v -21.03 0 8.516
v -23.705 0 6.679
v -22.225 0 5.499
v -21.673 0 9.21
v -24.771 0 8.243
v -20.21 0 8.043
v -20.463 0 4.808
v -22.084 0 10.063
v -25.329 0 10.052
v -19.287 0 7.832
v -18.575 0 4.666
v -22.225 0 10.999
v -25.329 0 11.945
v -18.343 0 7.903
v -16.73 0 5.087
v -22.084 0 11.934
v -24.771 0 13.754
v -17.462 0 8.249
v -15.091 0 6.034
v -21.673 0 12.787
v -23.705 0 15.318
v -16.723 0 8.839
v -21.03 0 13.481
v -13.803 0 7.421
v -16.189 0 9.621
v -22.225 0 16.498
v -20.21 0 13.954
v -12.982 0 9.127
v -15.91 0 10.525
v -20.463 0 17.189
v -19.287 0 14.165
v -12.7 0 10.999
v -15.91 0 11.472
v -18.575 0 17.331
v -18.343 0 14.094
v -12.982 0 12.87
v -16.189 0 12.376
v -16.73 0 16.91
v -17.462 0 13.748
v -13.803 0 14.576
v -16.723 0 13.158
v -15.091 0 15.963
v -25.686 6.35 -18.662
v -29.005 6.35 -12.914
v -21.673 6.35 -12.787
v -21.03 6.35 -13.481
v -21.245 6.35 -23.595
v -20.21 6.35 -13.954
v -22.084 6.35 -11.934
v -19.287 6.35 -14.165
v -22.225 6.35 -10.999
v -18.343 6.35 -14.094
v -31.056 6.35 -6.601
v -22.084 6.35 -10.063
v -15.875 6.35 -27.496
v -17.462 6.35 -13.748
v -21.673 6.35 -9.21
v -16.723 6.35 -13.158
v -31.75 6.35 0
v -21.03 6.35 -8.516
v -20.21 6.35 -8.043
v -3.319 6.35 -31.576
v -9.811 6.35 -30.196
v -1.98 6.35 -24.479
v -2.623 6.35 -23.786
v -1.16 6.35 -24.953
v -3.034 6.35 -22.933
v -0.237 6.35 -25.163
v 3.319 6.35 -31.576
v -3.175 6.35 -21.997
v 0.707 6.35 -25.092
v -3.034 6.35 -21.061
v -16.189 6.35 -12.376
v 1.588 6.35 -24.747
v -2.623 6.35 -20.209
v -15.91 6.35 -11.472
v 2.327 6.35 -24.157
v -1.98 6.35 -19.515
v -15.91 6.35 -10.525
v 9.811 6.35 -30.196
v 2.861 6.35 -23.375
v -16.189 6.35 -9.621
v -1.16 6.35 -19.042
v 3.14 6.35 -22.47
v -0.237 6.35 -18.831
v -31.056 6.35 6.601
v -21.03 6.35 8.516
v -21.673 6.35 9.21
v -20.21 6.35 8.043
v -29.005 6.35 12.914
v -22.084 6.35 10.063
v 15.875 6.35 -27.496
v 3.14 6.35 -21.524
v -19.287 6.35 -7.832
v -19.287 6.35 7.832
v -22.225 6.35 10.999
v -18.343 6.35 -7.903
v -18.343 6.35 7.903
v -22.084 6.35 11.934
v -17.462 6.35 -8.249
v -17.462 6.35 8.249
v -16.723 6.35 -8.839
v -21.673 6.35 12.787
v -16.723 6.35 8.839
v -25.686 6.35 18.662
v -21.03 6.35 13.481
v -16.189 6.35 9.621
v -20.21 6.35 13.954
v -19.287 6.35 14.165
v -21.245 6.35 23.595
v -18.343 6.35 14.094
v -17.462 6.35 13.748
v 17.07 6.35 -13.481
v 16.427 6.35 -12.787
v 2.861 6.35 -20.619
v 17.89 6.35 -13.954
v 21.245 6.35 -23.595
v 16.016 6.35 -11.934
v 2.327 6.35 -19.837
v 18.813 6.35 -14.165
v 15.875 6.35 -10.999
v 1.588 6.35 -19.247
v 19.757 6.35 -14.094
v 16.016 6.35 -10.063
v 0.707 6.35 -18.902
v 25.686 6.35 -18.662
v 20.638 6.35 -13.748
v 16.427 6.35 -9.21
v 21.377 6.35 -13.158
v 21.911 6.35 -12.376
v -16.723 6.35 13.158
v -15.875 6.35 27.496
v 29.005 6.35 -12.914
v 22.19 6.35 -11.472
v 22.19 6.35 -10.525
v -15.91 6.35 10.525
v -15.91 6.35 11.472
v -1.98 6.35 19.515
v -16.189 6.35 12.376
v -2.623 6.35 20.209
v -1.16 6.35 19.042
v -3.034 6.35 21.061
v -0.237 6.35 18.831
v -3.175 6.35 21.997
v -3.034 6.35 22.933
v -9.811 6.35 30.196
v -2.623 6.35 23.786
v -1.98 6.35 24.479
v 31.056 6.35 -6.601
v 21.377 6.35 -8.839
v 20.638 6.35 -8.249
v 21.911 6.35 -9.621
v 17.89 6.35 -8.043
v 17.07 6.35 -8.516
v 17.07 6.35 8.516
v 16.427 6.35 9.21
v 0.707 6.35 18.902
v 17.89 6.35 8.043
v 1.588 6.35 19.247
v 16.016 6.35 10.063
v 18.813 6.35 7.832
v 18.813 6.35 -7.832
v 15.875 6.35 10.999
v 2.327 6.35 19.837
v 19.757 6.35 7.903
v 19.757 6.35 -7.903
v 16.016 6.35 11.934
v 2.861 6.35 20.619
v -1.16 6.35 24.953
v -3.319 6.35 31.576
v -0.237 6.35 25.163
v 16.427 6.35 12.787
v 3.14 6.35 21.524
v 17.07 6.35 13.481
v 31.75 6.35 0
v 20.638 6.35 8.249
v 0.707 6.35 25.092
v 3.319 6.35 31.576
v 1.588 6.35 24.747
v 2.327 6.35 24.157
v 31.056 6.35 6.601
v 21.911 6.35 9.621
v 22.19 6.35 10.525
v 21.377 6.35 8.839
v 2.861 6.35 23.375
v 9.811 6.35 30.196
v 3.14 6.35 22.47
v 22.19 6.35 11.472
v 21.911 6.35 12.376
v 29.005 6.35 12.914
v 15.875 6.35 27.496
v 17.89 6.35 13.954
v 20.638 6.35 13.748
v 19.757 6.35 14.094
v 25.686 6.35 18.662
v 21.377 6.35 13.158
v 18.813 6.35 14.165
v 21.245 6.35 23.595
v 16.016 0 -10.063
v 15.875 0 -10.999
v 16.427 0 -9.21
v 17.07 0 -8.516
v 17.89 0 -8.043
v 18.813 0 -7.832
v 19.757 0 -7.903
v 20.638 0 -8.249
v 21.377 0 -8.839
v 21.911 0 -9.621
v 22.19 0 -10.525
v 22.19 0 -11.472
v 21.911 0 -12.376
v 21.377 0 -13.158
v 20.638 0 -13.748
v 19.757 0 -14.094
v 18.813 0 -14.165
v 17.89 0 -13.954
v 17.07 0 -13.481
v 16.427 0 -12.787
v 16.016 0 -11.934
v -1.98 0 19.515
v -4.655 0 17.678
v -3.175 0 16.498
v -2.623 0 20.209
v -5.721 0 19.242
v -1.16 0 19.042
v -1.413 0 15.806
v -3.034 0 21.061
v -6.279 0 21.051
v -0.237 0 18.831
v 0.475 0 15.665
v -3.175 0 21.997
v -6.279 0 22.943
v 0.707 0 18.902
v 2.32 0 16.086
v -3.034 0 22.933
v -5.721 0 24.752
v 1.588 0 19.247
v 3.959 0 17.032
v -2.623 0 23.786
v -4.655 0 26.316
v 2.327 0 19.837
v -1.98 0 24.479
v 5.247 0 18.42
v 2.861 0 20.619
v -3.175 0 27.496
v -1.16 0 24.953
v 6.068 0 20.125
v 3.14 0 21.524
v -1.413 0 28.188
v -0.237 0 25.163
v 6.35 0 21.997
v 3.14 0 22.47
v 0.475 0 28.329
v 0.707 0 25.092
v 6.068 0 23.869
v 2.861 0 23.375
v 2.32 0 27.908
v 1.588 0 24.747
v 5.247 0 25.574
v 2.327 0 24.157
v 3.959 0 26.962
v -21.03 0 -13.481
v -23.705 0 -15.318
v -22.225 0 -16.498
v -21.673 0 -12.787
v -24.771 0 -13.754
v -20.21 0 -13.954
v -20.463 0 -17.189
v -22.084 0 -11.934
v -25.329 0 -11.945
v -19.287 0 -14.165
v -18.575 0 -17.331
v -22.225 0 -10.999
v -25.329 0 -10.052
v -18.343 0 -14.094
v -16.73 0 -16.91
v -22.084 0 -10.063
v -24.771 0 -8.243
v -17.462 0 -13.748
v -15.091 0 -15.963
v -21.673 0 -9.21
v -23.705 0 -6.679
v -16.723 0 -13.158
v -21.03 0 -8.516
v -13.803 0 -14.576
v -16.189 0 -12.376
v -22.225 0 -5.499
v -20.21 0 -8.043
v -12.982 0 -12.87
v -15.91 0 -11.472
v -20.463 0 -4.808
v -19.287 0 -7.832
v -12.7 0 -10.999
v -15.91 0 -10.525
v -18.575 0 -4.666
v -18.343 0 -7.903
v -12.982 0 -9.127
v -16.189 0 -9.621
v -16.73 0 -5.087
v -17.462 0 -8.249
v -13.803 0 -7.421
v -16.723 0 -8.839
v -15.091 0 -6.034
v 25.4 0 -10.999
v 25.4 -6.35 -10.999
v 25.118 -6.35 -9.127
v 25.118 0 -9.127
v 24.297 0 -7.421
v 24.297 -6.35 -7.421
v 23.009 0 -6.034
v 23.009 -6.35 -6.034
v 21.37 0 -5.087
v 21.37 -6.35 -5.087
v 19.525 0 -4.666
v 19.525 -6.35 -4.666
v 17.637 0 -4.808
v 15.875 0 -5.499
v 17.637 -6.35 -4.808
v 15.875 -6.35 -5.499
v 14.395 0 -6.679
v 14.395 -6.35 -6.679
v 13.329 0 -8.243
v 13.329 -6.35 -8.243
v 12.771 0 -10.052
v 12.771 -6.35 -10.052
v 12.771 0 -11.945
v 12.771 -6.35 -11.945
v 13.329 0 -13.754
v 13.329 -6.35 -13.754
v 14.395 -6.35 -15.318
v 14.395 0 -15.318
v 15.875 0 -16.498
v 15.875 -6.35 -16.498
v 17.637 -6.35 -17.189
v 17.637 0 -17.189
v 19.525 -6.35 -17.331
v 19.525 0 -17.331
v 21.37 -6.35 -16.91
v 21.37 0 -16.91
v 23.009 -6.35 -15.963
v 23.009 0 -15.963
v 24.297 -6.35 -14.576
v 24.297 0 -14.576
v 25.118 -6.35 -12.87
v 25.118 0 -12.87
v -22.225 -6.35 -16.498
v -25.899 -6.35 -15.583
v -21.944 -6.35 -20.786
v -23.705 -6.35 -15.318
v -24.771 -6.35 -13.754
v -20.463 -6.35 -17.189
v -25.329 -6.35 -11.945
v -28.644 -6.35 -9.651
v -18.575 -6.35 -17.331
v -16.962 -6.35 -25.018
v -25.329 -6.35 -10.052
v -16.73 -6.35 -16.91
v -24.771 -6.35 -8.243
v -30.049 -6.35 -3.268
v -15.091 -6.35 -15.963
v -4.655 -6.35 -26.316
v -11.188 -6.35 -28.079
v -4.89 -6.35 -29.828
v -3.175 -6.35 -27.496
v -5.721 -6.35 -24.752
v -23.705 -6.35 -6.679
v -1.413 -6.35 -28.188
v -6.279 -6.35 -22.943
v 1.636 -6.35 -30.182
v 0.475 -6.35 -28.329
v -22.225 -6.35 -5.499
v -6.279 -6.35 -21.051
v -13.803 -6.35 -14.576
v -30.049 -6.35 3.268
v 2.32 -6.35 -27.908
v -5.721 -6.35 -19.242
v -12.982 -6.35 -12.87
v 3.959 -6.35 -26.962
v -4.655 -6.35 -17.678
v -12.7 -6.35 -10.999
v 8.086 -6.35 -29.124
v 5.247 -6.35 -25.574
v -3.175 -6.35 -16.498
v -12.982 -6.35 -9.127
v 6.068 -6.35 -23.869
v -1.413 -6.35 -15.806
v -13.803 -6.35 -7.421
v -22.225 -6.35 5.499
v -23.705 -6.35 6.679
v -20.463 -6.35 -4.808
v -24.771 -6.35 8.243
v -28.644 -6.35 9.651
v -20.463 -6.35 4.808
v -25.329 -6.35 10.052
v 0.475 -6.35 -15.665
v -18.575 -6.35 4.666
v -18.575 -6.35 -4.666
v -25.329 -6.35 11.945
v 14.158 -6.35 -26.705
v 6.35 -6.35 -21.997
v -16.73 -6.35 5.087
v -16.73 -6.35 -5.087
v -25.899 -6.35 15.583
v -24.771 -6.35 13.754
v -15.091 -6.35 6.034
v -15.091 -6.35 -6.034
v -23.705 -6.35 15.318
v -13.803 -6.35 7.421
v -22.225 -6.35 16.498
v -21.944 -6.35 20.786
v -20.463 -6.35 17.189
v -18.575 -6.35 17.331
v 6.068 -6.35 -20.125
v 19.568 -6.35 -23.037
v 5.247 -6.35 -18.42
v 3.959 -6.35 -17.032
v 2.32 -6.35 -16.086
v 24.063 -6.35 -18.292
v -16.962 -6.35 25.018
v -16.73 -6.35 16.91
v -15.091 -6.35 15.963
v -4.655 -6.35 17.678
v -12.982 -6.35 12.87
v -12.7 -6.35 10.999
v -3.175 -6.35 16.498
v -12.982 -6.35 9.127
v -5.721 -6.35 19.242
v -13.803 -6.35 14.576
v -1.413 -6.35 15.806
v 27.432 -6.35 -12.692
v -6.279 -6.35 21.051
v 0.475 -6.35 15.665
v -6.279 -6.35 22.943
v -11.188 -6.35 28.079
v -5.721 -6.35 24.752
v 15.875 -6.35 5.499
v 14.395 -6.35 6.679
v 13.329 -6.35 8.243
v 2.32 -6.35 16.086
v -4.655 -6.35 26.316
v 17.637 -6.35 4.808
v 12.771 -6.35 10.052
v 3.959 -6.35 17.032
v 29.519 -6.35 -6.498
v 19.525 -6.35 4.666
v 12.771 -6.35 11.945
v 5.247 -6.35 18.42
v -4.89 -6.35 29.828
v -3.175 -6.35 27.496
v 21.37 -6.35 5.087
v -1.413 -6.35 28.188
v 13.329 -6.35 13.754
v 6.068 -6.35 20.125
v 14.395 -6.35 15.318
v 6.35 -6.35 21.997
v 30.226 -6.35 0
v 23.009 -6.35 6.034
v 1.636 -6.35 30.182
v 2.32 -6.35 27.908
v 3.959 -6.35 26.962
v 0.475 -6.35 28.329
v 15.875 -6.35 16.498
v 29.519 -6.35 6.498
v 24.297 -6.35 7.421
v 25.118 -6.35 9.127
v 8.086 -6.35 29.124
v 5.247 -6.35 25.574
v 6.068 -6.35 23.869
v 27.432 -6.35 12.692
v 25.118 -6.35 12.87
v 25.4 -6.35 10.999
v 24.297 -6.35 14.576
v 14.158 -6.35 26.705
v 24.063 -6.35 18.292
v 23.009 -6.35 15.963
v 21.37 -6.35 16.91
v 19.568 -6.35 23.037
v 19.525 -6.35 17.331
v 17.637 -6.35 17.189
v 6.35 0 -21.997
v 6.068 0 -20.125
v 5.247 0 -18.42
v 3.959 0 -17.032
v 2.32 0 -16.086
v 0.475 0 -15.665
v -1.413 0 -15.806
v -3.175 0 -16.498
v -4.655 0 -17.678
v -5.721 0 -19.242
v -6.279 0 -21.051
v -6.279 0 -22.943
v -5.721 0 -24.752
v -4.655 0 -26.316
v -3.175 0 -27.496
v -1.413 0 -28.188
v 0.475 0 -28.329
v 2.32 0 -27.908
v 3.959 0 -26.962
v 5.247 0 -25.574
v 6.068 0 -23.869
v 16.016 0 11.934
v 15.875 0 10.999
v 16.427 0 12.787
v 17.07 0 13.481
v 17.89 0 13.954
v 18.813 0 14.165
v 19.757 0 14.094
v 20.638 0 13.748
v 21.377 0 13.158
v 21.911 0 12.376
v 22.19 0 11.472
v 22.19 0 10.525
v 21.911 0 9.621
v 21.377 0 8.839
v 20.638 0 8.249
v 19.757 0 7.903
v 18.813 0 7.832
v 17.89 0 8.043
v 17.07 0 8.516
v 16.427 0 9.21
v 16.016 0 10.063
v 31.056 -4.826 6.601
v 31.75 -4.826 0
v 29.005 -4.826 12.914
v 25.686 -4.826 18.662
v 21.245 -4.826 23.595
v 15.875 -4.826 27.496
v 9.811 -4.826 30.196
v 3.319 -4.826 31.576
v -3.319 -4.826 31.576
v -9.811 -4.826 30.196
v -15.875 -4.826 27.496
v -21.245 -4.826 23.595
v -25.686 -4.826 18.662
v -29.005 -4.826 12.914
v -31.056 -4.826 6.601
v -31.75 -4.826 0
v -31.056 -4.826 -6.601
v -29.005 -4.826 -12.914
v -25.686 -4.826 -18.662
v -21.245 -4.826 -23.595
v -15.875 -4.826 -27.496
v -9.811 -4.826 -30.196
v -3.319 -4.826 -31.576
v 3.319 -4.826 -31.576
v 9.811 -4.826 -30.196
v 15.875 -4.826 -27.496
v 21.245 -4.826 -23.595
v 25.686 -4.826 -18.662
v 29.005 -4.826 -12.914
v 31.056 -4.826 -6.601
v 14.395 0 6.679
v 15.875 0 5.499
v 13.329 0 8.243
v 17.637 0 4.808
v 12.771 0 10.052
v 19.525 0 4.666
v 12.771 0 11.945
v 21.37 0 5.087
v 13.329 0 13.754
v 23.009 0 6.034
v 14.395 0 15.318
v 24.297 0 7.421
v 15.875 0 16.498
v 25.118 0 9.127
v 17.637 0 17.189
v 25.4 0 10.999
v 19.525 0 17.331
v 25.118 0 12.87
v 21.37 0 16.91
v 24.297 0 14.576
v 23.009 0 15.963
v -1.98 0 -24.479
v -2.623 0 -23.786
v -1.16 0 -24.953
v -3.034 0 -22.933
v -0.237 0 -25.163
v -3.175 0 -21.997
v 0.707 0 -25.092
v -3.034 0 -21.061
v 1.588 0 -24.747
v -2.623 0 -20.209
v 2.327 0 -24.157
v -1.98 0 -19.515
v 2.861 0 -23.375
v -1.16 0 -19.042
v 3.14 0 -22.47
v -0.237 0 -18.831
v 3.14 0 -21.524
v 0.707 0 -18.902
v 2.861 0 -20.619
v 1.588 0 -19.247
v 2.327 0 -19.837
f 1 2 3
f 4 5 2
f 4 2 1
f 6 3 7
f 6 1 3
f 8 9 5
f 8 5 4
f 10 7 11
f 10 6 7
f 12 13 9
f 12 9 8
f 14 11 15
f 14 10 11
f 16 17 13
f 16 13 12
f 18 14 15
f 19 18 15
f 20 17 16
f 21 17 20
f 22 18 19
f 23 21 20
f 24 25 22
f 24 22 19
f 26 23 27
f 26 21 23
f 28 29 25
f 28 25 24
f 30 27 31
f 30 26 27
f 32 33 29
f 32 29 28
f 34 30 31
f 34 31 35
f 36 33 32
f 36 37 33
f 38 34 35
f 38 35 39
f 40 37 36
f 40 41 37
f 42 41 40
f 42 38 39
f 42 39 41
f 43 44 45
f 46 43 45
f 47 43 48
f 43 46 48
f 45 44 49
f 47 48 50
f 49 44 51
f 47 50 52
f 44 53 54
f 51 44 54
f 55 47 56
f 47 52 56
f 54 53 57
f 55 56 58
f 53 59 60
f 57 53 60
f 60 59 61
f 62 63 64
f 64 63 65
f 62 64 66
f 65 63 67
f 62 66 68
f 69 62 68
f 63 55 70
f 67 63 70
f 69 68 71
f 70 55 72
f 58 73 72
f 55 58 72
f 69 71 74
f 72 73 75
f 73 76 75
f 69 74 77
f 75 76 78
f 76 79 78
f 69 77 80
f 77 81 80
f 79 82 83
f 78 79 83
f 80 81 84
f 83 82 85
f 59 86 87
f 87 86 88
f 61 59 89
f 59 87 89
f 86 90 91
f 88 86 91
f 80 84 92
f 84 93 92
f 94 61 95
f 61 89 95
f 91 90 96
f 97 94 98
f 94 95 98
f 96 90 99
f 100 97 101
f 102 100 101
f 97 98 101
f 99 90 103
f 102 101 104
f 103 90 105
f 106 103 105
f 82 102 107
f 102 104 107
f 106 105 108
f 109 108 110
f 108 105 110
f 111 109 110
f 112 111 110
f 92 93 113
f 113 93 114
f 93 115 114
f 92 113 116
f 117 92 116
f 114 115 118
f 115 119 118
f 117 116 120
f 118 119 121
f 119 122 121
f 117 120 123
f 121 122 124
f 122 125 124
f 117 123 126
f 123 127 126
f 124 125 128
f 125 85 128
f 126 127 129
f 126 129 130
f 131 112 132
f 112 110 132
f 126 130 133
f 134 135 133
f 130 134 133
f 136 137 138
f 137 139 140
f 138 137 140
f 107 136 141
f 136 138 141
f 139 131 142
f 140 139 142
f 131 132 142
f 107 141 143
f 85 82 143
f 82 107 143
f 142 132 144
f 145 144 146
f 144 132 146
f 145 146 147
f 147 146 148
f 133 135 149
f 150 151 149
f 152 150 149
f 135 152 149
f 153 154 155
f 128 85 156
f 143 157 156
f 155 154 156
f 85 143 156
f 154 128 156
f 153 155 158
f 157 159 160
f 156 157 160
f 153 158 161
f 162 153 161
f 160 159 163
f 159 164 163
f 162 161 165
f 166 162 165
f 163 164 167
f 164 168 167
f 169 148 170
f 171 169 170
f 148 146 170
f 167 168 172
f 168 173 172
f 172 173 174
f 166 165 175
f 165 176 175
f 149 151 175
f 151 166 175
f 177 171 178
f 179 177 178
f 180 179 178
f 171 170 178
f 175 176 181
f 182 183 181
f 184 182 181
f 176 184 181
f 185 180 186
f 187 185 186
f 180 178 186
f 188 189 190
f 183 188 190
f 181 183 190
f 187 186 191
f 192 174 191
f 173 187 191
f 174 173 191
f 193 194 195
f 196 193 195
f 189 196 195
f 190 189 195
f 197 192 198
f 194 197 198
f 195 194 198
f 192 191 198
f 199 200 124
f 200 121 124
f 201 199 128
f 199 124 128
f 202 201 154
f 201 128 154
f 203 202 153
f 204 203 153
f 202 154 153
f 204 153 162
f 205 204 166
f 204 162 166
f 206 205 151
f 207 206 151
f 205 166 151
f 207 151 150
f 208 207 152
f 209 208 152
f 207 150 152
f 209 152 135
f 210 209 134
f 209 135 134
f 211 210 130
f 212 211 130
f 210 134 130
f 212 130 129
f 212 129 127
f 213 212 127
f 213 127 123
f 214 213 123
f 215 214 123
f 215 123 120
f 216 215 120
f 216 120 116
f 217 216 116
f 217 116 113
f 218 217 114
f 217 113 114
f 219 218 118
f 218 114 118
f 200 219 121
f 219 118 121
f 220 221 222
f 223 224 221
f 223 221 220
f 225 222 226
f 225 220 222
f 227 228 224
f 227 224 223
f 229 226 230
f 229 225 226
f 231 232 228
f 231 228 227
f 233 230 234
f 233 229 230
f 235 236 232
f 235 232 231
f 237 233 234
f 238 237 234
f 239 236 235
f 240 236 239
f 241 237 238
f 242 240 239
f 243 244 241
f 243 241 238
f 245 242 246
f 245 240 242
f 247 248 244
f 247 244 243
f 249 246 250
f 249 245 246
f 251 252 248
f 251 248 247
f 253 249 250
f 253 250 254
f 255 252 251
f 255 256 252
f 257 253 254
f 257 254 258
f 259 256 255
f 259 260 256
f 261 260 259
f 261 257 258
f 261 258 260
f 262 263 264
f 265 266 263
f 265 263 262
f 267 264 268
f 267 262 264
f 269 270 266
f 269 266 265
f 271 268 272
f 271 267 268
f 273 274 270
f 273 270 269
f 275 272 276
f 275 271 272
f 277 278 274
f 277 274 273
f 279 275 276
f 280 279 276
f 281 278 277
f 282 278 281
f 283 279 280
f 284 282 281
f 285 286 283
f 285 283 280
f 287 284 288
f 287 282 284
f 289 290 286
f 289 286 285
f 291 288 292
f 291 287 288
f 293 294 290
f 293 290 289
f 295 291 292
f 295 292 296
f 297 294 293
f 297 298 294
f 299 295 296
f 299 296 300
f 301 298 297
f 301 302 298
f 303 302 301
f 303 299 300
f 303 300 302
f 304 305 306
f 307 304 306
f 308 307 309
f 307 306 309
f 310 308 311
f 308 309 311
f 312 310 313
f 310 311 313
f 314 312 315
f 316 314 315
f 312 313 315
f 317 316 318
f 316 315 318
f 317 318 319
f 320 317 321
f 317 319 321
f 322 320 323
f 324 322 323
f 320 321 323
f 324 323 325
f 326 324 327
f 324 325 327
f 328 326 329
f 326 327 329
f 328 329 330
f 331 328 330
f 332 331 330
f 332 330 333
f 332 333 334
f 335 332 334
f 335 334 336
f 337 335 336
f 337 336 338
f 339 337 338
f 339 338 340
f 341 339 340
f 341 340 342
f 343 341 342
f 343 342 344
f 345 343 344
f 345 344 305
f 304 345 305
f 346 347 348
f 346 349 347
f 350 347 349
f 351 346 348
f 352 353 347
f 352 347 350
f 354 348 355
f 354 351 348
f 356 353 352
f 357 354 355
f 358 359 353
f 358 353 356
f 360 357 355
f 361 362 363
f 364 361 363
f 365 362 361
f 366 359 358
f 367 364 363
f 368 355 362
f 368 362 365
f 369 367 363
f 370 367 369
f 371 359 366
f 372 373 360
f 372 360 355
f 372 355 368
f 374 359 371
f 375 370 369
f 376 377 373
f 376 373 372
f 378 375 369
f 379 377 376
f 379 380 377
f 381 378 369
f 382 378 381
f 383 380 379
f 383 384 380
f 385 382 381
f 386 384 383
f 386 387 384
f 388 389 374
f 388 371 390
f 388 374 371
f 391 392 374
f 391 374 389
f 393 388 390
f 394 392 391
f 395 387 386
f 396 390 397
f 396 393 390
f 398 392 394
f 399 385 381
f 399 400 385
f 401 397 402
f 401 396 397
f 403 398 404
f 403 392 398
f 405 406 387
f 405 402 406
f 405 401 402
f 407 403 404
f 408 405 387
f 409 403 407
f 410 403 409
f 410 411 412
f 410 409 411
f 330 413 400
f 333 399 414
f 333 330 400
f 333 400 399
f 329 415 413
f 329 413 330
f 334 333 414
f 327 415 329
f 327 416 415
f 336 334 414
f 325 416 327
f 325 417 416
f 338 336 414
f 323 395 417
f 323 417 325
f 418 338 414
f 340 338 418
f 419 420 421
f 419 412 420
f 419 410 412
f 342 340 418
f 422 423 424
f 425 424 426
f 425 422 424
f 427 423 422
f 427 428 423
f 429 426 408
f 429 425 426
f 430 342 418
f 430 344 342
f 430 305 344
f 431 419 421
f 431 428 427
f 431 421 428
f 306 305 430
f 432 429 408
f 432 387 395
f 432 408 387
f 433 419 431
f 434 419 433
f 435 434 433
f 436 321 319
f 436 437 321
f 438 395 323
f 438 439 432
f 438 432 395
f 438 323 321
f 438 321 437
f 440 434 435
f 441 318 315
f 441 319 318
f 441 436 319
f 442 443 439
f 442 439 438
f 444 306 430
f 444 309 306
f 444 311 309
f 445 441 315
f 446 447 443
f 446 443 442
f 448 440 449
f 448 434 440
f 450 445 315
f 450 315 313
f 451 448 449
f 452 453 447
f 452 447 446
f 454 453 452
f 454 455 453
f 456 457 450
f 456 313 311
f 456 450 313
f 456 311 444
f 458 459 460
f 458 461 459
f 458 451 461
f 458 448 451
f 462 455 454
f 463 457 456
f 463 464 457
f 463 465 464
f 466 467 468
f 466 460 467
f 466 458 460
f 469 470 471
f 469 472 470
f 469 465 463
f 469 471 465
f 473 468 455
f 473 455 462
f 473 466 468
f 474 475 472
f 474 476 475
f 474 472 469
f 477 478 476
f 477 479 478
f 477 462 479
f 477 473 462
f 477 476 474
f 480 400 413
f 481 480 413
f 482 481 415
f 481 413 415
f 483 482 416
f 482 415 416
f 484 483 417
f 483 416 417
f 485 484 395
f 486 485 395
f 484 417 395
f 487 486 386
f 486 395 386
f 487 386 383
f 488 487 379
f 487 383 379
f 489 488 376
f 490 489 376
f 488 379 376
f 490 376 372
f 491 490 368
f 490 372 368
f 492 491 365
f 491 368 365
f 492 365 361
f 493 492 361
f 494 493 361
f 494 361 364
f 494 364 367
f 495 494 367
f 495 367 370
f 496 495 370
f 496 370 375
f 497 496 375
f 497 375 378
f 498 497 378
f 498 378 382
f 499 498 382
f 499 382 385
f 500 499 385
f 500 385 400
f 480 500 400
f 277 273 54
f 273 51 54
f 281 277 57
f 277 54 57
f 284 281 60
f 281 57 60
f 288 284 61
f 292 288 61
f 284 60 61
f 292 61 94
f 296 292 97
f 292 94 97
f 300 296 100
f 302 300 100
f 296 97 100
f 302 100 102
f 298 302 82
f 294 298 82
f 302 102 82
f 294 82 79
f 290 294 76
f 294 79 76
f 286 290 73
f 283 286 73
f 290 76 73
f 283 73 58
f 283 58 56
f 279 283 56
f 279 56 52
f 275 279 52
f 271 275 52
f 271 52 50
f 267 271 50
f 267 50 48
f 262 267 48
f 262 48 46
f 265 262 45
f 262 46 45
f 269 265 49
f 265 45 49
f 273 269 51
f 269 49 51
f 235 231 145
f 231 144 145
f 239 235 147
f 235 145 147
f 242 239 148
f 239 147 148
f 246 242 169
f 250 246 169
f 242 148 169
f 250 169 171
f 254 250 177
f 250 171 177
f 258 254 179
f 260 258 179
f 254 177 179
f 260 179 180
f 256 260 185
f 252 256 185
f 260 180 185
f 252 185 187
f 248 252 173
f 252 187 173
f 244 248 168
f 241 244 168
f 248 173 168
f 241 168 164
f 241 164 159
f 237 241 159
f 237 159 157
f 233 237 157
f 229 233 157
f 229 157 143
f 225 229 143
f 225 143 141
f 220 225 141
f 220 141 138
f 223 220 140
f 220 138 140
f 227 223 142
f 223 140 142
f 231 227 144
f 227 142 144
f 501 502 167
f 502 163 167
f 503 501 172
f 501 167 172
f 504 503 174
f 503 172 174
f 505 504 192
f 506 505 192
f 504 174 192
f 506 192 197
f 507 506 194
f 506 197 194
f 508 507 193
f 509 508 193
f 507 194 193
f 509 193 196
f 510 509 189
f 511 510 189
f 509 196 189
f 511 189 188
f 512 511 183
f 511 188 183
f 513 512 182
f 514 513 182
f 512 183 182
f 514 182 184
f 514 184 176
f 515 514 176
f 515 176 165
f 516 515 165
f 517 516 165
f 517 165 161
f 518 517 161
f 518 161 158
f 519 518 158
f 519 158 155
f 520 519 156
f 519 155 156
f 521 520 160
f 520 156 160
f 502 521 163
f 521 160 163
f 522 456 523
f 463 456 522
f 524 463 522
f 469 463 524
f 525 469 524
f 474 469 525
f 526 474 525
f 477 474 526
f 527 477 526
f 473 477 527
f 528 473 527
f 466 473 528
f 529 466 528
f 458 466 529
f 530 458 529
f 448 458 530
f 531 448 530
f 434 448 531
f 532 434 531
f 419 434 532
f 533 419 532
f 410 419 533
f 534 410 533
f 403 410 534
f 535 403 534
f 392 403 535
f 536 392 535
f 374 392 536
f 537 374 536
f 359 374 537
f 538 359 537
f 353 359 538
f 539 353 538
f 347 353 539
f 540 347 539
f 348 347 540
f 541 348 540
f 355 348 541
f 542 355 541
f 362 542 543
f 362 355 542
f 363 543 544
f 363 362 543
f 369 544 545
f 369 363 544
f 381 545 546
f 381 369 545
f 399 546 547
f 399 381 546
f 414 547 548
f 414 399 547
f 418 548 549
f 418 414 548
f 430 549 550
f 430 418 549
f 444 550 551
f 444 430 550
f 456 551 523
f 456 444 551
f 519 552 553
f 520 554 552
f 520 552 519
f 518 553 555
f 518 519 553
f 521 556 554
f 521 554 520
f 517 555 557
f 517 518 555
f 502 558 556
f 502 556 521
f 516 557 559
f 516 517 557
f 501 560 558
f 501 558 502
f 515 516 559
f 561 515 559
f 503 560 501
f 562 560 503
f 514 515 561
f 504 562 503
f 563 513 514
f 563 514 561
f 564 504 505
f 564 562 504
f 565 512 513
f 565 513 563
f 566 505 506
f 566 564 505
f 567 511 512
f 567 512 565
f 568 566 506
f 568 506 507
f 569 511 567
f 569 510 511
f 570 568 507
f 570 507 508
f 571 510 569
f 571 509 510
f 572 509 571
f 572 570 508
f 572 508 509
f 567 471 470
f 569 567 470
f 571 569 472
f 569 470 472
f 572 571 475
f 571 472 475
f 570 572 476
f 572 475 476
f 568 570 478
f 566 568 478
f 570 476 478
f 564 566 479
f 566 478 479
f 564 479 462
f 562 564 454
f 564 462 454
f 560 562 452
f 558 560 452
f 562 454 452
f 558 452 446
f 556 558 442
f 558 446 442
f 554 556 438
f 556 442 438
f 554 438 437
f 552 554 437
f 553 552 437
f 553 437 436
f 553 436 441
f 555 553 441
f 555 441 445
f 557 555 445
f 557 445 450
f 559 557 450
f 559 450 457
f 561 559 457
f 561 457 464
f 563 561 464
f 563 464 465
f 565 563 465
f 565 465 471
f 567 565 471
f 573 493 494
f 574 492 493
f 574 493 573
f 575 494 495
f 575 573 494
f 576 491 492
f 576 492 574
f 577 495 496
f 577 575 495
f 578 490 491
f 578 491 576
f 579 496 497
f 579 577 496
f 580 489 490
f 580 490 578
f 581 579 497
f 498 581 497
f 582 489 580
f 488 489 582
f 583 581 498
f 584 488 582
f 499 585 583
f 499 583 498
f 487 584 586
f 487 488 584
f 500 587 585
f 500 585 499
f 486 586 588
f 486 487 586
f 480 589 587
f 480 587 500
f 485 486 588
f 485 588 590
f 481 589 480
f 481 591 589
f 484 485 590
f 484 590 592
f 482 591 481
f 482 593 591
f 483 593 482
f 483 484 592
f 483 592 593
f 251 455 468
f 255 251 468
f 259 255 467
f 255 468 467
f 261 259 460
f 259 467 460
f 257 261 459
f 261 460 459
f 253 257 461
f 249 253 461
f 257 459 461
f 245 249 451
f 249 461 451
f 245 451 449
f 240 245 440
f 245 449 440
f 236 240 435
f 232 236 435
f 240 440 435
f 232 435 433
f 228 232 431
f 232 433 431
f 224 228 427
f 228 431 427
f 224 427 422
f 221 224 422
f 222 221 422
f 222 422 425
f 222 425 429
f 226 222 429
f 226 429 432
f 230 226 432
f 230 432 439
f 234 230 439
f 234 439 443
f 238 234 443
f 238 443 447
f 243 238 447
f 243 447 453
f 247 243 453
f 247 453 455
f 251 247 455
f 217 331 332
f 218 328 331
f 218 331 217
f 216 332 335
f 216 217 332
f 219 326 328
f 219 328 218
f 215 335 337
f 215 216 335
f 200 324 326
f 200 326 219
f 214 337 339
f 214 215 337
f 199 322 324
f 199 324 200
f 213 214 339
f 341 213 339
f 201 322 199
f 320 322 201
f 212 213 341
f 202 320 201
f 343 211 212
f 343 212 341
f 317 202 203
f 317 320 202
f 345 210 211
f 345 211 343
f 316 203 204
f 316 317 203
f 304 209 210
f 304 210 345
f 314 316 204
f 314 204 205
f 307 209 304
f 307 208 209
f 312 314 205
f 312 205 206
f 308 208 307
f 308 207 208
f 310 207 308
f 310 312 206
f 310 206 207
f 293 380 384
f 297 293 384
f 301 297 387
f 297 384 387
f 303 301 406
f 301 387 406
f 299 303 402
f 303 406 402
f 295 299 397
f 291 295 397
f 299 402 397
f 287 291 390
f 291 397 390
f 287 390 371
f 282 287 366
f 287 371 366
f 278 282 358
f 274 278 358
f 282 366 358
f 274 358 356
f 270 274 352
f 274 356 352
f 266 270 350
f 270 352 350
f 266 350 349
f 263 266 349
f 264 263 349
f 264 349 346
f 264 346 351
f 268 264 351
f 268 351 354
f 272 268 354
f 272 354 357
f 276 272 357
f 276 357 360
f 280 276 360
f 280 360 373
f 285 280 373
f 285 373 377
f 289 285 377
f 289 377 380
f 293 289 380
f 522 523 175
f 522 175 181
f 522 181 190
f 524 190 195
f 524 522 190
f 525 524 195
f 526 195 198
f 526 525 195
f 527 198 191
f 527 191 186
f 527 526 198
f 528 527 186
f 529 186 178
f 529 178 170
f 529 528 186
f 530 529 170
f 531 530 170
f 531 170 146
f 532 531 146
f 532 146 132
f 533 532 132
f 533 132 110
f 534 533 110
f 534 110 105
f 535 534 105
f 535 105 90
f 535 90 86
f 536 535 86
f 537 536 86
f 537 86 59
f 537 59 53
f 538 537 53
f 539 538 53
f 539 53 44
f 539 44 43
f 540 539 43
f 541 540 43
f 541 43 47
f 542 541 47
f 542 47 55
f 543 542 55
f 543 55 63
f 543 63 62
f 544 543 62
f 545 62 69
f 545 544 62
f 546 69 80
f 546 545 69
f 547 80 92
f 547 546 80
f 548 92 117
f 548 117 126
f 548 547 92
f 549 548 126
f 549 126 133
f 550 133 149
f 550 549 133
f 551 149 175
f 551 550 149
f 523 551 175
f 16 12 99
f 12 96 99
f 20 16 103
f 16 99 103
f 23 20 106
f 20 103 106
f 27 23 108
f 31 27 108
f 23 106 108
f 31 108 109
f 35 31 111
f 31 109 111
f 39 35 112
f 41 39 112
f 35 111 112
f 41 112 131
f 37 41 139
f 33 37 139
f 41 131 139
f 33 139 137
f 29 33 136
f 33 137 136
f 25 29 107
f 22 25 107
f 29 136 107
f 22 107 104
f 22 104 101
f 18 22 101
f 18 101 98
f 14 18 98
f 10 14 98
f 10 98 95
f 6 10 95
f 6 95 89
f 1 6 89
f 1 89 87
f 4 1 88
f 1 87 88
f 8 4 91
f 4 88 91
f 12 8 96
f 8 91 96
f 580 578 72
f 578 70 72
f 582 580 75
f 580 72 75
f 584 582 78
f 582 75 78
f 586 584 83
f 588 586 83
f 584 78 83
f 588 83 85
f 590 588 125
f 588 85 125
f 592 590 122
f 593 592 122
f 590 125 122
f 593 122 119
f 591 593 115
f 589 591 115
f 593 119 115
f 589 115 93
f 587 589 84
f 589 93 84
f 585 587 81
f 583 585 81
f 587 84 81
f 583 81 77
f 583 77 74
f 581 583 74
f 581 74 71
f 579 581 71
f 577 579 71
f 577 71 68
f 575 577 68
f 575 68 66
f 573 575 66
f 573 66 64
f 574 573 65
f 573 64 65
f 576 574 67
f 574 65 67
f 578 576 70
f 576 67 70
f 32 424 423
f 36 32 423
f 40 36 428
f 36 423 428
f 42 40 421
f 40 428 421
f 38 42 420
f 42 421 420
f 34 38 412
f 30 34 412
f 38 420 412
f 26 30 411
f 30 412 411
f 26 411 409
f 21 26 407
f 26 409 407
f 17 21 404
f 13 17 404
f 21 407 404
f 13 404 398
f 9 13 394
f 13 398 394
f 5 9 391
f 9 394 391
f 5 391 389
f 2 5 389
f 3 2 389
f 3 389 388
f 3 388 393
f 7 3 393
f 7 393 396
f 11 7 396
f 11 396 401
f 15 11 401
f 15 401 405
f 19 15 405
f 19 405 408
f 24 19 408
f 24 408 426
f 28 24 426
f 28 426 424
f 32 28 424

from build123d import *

# Parameters (mm, degrees)
F0_R           = 31.75
F1_DEPTH       = 6.35
F3_D           = 6.35
F3_CBORE_D     = 12.7
F3_CBORE_DEPTH = 6.35
F4_SIZE        = 1.524


with BuildPart() as f1:
    # F0 (on Front) → F1 (new body, symmetric)
    with BuildSketch(Plane.XZ):
        Circle(F0_R)
    extrude(amount=F1_DEPTH, both=True)

    # F3 (through all)
    with Locations(Plane.XZ.offset(6.35)):
        with Locations((-19.05, 10.998523), (0, 21.997045), (19.05, 10.998523), (19.05, -10.998523), (0, -21.997045), (-19.05, -10.998523)):
            CounterBoreHole(F3_D / 2, F3_CBORE_D / 2, F3_CBORE_DEPTH)

    # F4
    f4_edges = [f1.edges().sort_by_distance(p)[0] for p in [
        (-31.75, -6.35, 0),
    ]]
    chamfer(f4_edges, length=F4_SIZE)


solid = f1.part
